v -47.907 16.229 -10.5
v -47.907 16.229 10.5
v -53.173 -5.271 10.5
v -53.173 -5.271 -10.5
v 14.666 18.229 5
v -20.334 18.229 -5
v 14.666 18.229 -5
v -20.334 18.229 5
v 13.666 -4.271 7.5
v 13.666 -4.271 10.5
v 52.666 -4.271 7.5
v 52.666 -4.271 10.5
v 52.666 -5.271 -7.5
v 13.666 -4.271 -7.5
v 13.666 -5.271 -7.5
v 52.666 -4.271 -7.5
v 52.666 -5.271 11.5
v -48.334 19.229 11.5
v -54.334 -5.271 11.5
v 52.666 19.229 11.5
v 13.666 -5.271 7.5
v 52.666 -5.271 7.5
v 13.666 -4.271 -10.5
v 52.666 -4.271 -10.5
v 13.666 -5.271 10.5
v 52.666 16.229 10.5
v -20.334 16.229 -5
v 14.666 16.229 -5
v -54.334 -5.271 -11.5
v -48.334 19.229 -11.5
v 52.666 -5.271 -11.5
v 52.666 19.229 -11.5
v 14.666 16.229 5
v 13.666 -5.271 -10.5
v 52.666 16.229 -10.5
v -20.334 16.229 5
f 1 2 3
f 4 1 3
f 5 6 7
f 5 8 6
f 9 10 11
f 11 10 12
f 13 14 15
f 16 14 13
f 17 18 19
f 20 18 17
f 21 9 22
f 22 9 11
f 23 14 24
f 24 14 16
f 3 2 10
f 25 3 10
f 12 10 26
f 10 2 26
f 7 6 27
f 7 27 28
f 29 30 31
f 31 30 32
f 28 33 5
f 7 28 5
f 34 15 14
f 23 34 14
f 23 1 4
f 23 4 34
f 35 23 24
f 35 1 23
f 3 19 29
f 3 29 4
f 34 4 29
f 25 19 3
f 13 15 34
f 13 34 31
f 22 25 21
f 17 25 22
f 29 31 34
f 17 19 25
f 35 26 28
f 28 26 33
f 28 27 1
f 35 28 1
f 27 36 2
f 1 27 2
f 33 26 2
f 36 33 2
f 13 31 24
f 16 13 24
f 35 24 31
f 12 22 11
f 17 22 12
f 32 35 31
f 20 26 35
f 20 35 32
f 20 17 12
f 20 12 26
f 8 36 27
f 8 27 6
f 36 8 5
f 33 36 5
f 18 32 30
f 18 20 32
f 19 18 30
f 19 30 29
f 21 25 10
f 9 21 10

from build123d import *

# Parameters (mm, degrees)
F1_DEPTH = 11.5
F3_DEPTH = 10.5
F4_W     = 57.923077
F4_H     = 25.561713
F5_DEPTH = 7.5
F6_W     = 35
F6_H     = 5.974728
F7_DEPTH = 5


with BuildPart() as f1:
    # F0 (on Top) → F1 (new body, symmetric)
    with BuildSketch(Plane.XY):
        Polygon((52.666136, 19.229225), (-48.333864, 19.229225), (-54.333864, -5.270775), (52.666136, -5.270775), align=None)
    extrude(amount=F1_DEPTH, both=True)

    # F2 (on Top) → F3 (cut, symmetric)
    with BuildSketch(Plane.XY):
        Polygon((13.666136, -4.270775), (53.666136, -4.270775), (53.666136, 16.229225), (-47.907322, 16.229225), (-53.662424, -7.270775), (13.666136, -7.270775), align=None)
    extrude(amount=F3_DEPTH, both=True, mode=Mode.SUBTRACT)

    # F4 (on Top) → F5 (cut, symmetric)
    with BuildSketch(Plane.XY):
        with Locations((33.046458, -3.861708)):
            Rectangle(F4_W, F4_H)
    extrude(amount=F5_DEPTH, both=True, mode=Mode.SUBTRACT)

    # F6 (on Top) → F7 (cut, symmetric)
    with BuildSketch(Plane.XY):
        with Locations((-2.833864, 15.241861)):
            Rectangle(F6_W, F6_H)
    extrude(amount=F7_DEPTH, both=True, mode=Mode.SUBTRACT)


solid = f1.part
